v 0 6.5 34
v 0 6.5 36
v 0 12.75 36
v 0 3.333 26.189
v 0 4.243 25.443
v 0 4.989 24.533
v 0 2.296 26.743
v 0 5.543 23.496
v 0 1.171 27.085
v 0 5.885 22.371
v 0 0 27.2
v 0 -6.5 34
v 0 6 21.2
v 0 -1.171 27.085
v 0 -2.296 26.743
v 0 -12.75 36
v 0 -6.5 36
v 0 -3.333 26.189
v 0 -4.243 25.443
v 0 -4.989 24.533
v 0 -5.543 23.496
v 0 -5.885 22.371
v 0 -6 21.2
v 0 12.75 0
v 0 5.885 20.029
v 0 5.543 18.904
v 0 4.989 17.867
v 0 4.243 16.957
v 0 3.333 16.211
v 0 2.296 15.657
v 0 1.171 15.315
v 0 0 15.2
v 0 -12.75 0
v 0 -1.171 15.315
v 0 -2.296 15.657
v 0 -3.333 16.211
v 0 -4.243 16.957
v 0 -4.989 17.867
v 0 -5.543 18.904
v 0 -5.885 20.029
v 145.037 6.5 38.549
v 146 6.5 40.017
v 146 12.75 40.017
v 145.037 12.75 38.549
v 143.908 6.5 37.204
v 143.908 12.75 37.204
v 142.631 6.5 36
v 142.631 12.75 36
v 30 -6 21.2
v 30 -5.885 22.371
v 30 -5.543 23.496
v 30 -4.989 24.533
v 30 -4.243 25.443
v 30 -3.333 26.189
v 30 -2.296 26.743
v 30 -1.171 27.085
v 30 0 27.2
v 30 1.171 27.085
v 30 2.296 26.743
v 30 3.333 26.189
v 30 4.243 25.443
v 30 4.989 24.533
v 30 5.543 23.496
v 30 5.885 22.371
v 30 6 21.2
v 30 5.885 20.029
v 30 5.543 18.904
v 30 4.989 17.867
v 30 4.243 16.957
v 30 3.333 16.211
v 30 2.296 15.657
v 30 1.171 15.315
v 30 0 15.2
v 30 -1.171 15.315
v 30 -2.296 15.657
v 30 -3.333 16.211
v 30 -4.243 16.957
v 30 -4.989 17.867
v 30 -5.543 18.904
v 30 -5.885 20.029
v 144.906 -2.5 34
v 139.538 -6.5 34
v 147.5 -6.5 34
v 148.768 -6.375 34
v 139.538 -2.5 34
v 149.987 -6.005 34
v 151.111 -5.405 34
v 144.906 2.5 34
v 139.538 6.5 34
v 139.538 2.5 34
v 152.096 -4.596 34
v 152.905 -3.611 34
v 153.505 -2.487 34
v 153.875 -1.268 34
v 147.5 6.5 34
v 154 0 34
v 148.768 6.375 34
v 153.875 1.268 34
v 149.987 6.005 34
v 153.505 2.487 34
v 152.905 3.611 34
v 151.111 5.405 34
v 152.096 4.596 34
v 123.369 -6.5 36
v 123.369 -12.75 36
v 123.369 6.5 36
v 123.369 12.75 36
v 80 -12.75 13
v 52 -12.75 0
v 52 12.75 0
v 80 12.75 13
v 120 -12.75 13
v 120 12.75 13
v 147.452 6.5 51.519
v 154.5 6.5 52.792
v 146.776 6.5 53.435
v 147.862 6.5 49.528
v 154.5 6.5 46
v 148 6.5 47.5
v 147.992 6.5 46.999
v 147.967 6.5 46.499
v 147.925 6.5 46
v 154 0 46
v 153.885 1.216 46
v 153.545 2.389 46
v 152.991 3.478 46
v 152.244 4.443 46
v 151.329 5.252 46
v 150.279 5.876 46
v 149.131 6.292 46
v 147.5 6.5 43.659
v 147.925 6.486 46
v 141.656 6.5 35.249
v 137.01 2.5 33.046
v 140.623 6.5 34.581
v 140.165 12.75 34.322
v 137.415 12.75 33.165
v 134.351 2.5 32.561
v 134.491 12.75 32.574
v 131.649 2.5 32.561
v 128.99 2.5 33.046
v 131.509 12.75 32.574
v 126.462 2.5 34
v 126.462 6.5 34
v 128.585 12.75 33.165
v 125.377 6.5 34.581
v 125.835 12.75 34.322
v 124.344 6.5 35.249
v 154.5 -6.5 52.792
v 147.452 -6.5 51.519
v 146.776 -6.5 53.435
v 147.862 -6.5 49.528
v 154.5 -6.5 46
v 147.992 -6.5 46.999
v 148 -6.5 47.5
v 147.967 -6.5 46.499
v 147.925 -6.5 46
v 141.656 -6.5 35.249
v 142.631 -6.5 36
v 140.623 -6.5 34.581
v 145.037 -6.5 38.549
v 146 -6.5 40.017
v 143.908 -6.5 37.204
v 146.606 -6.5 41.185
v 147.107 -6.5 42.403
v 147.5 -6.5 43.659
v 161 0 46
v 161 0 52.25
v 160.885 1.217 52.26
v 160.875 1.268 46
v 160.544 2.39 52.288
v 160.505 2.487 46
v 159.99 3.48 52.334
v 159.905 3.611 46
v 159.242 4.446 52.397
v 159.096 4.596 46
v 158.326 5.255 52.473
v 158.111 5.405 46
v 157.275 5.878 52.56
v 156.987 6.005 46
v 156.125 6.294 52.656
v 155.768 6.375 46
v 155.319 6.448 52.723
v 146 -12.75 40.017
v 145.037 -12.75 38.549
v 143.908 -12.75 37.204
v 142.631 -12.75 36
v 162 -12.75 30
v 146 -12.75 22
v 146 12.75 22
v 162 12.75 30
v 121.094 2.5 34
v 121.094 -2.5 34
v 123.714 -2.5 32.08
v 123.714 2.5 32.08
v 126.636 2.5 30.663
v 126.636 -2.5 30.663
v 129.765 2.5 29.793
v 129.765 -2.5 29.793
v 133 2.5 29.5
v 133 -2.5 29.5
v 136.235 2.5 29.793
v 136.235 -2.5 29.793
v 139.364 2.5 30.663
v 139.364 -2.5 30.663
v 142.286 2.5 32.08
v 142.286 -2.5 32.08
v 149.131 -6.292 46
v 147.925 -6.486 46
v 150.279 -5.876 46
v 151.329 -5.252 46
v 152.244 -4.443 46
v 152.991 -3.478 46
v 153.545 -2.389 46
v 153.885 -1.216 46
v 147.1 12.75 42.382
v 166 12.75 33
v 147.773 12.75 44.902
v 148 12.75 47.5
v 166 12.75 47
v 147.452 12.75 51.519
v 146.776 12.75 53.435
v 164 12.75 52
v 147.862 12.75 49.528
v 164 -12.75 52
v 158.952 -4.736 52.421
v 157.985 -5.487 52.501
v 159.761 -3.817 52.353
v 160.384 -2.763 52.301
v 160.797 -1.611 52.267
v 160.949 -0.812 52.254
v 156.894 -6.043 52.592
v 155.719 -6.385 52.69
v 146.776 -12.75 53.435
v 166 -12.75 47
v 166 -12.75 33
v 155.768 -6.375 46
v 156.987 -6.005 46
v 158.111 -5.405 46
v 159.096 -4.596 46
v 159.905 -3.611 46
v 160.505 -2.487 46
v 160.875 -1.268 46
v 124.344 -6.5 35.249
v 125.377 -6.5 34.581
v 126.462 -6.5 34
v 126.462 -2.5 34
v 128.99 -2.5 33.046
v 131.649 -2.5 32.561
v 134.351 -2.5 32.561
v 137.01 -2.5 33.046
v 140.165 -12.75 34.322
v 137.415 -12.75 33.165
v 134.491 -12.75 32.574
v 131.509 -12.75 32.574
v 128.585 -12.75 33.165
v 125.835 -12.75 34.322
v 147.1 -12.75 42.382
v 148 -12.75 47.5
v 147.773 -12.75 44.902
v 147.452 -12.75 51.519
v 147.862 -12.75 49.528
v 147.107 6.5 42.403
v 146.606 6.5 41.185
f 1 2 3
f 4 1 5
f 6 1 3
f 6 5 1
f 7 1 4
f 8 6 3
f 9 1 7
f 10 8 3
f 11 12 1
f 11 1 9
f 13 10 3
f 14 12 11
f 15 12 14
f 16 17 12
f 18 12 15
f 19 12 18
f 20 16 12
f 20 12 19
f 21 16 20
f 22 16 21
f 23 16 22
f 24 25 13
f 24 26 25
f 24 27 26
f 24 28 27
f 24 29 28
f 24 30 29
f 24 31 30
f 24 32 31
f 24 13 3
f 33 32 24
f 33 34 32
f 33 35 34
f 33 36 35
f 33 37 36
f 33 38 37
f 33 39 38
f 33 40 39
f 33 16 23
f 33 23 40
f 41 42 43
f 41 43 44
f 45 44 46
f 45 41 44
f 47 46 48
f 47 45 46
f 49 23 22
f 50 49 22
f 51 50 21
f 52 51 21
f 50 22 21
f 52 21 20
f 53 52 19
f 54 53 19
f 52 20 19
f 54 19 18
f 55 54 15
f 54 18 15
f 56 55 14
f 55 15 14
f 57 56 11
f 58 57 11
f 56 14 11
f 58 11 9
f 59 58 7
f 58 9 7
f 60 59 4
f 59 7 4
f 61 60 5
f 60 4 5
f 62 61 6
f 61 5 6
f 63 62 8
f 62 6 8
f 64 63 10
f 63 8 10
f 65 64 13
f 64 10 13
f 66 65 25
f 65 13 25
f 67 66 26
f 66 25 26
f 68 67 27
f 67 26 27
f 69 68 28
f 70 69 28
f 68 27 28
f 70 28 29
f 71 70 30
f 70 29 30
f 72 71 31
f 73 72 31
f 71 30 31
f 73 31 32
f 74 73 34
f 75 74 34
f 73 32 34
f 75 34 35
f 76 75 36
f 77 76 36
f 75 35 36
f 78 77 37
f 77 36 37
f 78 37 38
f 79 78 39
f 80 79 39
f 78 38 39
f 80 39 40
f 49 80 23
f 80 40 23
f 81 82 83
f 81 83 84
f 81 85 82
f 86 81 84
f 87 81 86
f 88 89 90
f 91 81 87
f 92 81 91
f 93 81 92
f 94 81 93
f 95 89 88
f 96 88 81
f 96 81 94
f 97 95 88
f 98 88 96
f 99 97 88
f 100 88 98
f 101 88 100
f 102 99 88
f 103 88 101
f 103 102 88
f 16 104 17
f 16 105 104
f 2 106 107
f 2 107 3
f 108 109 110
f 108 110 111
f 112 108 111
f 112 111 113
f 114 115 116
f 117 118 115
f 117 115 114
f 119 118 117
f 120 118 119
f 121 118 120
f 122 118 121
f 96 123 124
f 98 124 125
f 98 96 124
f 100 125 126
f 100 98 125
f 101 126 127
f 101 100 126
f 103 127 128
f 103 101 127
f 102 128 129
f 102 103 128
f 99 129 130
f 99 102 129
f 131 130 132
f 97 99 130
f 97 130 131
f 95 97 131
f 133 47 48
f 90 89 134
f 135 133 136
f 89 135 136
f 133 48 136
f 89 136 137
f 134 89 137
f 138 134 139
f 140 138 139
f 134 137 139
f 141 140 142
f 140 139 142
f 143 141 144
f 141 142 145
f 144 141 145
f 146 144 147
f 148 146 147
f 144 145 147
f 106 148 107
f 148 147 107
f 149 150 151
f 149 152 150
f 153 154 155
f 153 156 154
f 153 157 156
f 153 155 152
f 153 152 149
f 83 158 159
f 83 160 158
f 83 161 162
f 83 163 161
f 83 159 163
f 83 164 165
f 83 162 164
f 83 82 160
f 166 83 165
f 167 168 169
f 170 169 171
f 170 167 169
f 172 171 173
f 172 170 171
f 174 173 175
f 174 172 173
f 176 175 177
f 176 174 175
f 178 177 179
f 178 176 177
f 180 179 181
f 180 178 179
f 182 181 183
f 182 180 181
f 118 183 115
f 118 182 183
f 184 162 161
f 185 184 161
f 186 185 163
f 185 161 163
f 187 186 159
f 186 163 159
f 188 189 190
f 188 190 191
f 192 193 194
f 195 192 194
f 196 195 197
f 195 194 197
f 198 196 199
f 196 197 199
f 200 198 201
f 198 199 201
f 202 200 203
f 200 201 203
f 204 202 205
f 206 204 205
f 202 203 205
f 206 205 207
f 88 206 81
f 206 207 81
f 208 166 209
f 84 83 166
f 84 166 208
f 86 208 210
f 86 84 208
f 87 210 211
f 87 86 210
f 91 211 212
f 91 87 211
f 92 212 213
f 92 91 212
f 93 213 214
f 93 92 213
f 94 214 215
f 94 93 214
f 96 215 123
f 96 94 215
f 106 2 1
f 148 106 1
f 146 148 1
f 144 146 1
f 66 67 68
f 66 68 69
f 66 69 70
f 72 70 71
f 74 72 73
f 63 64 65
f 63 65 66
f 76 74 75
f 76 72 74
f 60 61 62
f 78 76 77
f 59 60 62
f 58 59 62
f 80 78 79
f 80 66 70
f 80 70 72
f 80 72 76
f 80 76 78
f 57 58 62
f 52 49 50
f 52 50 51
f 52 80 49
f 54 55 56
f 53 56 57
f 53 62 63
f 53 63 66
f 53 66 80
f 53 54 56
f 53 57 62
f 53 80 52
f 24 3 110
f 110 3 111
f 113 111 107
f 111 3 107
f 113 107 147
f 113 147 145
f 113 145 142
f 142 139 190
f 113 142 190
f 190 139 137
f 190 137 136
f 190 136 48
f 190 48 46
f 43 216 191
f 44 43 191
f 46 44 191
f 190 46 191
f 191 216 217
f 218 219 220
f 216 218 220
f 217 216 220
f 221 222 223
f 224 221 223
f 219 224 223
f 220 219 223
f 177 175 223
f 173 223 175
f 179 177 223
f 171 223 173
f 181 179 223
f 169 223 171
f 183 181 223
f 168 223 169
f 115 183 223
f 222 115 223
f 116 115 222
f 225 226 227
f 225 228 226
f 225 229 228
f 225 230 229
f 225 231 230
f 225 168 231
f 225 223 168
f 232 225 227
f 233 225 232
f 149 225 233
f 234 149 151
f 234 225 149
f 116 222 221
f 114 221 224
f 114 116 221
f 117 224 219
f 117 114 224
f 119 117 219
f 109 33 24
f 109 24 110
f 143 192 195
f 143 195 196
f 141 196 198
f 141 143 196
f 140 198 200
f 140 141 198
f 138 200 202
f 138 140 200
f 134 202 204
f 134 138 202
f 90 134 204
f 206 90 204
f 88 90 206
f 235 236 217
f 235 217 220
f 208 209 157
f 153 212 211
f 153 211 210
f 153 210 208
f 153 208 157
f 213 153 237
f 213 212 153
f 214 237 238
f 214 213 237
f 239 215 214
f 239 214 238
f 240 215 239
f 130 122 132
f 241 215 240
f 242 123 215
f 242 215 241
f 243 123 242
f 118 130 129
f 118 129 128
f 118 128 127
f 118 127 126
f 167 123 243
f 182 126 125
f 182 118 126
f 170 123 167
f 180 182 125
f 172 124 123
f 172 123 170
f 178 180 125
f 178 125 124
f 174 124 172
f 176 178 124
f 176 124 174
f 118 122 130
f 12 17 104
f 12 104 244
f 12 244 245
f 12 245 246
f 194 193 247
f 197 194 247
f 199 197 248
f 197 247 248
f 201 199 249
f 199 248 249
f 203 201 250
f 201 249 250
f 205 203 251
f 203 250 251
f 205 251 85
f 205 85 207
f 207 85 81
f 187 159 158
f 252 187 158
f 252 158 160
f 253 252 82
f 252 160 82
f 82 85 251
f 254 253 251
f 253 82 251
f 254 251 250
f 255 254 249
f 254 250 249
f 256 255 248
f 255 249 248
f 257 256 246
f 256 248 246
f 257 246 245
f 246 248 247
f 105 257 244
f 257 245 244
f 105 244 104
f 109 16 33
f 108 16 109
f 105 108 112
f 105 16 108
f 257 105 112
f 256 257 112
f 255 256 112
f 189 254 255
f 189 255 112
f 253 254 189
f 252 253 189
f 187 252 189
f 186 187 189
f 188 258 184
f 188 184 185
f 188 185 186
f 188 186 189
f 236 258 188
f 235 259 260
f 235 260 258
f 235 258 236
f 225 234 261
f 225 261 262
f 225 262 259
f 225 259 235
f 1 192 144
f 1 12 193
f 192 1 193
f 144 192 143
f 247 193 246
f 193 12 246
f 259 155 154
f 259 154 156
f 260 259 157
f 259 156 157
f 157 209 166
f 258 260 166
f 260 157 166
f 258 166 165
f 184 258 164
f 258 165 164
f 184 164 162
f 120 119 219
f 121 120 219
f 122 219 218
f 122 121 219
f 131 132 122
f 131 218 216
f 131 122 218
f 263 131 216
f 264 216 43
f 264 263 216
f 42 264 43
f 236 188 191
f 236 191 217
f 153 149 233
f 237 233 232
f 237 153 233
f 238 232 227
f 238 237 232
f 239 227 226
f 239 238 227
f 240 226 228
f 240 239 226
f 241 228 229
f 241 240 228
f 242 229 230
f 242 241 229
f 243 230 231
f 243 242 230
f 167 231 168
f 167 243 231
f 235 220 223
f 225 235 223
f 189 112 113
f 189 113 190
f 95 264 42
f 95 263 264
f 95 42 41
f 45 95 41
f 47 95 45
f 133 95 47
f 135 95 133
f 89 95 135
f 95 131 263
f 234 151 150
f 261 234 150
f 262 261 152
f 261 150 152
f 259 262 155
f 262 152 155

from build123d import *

# Parameters (mm, degrees)
F1_DEPTH  = 12.75
F3_DEPTH  = 2.5
F5_DEPTH  = 6.5
F7_DEPTH  = 40.9
F10_DEPTH = 27.7
F11_R     = 6
F11_R_2   = 4.9
F12_DEPTH = 30


with BuildPart() as f1:
    # F0 (on Front) → F1 (new body, symmetric)
    with BuildSketch(Plane.XZ):
        with BuildLine():
            Line((0, 36), (0, 0))
            Line((0, 0), (52, 0))
            Line((52, 0), (80, 13))
            Line((80, 13), (120, 13))
            Line((120, 13), (146, 22))
            Line((146, 22), (162, 30))
            Line((162, 30), (166, 33))
            Line((166, 33), (166, 47))
            Line((166, 47), (164, 52))
            Line((164, 52), (146.7757606487, 53.4353532793))
            ThreePointArc((146.7757606487, 53.4353532793), (147.6907523587, 50.5301477084), (148, 47.5))
            ThreePointArc((148, 47.5), (147.4913767462, 43.6270166538), (146, 40.0166852265))
            Line((146, 40.0166852265), (146, 36))
            Line((146, 36), (142.6306801421, 36))
            ThreePointArc((142.6306801421, 36), (133, 32.5), (123.3693198579, 36))
            Line((123.3693198579, 36), (0, 36))
        make_face()
        with BuildLine():
            ThreePointArc((146, 40.0166852265), (144.4921869536, 37.8599979759), (142.6306801421, 36))
            Line((142.6306801421, 36), (146, 36))
            Line((146, 36), (146, 40.0166852265))
        make_face()
    extrude(amount=F1_DEPTH, both=True)

    # F2 (on Front) → F3 (cut, symmetric)
    with BuildSketch(Plane.XZ):
        with BuildLine():
            Line((123.3693198579, 36), (119.1526175759, 36))
            ThreePointArc((119.1526175759, 36), (120.0845966785, 34.9623623819), (121.0941191002, 34))
            ThreePointArc((121.0941191002, 34), (142.9238149728, 32.4827467097), (150.0871635222, 53.1594030398))
            Line((150.0871635222, 53.1594030398), (146.7757606487, 53.4353532793))
            ThreePointArc((146.7757606487, 53.4353532793), (141.9606533855, 35.4705905837), (123.3693198579, 36))
        make_face()
    extrude(amount=F3_DEPTH, both=True, mode=Mode.SUBTRACT)

    # F4 (on Front) → F5 (cut, symmetric)
    with BuildSketch(Plane.XZ):
        Polygon((119.1526175759, 36), (0, 36), (0, 34), (121.0941191002, 34), (129.1526175759, 34), (129.1526175759, 36), align=None)
    extrude(amount=F5_DEPTH, both=True, mode=Mode.SUBTRACT)

    # F6 (on face) → F7 (cut)
    with BuildSketch(Plane.XY.offset(34)):
        with BuildLine():
            ThreePointArc((147.5, -6.5), (152.0961940777, -4.5961940777), (154, 0))
            ThreePointArc((154, 0), (152.0961940777, 4.5961940777), (147.5, 6.5))
            Line((147.5, 6.5), (147.5, -6.5))
        make_face()
        with BuildLine():
            Line((147.5, -6.5), (147.5, 6.5))
            ThreePointArc((147.5, 6.5), (141, 0), (147.5, -6.5))
        make_face()
        with BuildLine():
            ThreePointArc((147.5, -6.5), (141, 0), (147.5, 6.5))
            Line((147.5, 6.5), (132.5, 6.5))
            Line((132.5, 6.5), (132.5, -6.5))
            Line((132.5, -6.5), (147.5, -6.5))
        make_face()
    extrude(amount=F7_DEPTH, mode=Mode.SUBTRACT)

    # F9 (on offset) → F10 (cut)
    with BuildSketch(Plane.XY.offset(46)):
        with BuildLine():
            ThreePointArc((154.5, -6.5), (159.0961940777, -4.5961940777), (161, 0))
            ThreePointArc((161, 0), (159.0961940777, 4.5961940777), (154.5, 6.5))
            Line((154.5, 6.5), (154.5, -6.5))
        make_face()
        with BuildLine():
            Line((154.5, -6.5), (154.5, 6.5))
            ThreePointArc((154.5, 6.5), (148, 0), (154.5, -6.5))
        make_face()
        with BuildLine():
            ThreePointArc((154.5, -6.5), (148, 0), (154.5, 6.5))
            Line((154.5, 6.5), (139.5, 6.5))
            Line((139.5, 6.5), (139.5, -6.5))
            Line((139.5, -6.5), (154.5, -6.5))
        make_face()
    extrude(amount=F10_DEPTH, mode=Mode.SUBTRACT)

    # F11 (on face) → F12 (cut)
    with BuildSketch(Plane(origin=(0, 0, 0), x_dir=(0, -1, 0), z_dir=(-1, 0, 0))):
        with Locations((0, 21.2)):
            Circle(F11_R)
        with Locations((0, 21.2)):
            Circle(F11_R_2, mode=Mode.SUBTRACT)
        with Locations((0, 21.2)):
            Circle(F11_R_2)
    extrude(amount=-F12_DEPTH, mode=Mode.SUBTRACT)


solid = f1.part
